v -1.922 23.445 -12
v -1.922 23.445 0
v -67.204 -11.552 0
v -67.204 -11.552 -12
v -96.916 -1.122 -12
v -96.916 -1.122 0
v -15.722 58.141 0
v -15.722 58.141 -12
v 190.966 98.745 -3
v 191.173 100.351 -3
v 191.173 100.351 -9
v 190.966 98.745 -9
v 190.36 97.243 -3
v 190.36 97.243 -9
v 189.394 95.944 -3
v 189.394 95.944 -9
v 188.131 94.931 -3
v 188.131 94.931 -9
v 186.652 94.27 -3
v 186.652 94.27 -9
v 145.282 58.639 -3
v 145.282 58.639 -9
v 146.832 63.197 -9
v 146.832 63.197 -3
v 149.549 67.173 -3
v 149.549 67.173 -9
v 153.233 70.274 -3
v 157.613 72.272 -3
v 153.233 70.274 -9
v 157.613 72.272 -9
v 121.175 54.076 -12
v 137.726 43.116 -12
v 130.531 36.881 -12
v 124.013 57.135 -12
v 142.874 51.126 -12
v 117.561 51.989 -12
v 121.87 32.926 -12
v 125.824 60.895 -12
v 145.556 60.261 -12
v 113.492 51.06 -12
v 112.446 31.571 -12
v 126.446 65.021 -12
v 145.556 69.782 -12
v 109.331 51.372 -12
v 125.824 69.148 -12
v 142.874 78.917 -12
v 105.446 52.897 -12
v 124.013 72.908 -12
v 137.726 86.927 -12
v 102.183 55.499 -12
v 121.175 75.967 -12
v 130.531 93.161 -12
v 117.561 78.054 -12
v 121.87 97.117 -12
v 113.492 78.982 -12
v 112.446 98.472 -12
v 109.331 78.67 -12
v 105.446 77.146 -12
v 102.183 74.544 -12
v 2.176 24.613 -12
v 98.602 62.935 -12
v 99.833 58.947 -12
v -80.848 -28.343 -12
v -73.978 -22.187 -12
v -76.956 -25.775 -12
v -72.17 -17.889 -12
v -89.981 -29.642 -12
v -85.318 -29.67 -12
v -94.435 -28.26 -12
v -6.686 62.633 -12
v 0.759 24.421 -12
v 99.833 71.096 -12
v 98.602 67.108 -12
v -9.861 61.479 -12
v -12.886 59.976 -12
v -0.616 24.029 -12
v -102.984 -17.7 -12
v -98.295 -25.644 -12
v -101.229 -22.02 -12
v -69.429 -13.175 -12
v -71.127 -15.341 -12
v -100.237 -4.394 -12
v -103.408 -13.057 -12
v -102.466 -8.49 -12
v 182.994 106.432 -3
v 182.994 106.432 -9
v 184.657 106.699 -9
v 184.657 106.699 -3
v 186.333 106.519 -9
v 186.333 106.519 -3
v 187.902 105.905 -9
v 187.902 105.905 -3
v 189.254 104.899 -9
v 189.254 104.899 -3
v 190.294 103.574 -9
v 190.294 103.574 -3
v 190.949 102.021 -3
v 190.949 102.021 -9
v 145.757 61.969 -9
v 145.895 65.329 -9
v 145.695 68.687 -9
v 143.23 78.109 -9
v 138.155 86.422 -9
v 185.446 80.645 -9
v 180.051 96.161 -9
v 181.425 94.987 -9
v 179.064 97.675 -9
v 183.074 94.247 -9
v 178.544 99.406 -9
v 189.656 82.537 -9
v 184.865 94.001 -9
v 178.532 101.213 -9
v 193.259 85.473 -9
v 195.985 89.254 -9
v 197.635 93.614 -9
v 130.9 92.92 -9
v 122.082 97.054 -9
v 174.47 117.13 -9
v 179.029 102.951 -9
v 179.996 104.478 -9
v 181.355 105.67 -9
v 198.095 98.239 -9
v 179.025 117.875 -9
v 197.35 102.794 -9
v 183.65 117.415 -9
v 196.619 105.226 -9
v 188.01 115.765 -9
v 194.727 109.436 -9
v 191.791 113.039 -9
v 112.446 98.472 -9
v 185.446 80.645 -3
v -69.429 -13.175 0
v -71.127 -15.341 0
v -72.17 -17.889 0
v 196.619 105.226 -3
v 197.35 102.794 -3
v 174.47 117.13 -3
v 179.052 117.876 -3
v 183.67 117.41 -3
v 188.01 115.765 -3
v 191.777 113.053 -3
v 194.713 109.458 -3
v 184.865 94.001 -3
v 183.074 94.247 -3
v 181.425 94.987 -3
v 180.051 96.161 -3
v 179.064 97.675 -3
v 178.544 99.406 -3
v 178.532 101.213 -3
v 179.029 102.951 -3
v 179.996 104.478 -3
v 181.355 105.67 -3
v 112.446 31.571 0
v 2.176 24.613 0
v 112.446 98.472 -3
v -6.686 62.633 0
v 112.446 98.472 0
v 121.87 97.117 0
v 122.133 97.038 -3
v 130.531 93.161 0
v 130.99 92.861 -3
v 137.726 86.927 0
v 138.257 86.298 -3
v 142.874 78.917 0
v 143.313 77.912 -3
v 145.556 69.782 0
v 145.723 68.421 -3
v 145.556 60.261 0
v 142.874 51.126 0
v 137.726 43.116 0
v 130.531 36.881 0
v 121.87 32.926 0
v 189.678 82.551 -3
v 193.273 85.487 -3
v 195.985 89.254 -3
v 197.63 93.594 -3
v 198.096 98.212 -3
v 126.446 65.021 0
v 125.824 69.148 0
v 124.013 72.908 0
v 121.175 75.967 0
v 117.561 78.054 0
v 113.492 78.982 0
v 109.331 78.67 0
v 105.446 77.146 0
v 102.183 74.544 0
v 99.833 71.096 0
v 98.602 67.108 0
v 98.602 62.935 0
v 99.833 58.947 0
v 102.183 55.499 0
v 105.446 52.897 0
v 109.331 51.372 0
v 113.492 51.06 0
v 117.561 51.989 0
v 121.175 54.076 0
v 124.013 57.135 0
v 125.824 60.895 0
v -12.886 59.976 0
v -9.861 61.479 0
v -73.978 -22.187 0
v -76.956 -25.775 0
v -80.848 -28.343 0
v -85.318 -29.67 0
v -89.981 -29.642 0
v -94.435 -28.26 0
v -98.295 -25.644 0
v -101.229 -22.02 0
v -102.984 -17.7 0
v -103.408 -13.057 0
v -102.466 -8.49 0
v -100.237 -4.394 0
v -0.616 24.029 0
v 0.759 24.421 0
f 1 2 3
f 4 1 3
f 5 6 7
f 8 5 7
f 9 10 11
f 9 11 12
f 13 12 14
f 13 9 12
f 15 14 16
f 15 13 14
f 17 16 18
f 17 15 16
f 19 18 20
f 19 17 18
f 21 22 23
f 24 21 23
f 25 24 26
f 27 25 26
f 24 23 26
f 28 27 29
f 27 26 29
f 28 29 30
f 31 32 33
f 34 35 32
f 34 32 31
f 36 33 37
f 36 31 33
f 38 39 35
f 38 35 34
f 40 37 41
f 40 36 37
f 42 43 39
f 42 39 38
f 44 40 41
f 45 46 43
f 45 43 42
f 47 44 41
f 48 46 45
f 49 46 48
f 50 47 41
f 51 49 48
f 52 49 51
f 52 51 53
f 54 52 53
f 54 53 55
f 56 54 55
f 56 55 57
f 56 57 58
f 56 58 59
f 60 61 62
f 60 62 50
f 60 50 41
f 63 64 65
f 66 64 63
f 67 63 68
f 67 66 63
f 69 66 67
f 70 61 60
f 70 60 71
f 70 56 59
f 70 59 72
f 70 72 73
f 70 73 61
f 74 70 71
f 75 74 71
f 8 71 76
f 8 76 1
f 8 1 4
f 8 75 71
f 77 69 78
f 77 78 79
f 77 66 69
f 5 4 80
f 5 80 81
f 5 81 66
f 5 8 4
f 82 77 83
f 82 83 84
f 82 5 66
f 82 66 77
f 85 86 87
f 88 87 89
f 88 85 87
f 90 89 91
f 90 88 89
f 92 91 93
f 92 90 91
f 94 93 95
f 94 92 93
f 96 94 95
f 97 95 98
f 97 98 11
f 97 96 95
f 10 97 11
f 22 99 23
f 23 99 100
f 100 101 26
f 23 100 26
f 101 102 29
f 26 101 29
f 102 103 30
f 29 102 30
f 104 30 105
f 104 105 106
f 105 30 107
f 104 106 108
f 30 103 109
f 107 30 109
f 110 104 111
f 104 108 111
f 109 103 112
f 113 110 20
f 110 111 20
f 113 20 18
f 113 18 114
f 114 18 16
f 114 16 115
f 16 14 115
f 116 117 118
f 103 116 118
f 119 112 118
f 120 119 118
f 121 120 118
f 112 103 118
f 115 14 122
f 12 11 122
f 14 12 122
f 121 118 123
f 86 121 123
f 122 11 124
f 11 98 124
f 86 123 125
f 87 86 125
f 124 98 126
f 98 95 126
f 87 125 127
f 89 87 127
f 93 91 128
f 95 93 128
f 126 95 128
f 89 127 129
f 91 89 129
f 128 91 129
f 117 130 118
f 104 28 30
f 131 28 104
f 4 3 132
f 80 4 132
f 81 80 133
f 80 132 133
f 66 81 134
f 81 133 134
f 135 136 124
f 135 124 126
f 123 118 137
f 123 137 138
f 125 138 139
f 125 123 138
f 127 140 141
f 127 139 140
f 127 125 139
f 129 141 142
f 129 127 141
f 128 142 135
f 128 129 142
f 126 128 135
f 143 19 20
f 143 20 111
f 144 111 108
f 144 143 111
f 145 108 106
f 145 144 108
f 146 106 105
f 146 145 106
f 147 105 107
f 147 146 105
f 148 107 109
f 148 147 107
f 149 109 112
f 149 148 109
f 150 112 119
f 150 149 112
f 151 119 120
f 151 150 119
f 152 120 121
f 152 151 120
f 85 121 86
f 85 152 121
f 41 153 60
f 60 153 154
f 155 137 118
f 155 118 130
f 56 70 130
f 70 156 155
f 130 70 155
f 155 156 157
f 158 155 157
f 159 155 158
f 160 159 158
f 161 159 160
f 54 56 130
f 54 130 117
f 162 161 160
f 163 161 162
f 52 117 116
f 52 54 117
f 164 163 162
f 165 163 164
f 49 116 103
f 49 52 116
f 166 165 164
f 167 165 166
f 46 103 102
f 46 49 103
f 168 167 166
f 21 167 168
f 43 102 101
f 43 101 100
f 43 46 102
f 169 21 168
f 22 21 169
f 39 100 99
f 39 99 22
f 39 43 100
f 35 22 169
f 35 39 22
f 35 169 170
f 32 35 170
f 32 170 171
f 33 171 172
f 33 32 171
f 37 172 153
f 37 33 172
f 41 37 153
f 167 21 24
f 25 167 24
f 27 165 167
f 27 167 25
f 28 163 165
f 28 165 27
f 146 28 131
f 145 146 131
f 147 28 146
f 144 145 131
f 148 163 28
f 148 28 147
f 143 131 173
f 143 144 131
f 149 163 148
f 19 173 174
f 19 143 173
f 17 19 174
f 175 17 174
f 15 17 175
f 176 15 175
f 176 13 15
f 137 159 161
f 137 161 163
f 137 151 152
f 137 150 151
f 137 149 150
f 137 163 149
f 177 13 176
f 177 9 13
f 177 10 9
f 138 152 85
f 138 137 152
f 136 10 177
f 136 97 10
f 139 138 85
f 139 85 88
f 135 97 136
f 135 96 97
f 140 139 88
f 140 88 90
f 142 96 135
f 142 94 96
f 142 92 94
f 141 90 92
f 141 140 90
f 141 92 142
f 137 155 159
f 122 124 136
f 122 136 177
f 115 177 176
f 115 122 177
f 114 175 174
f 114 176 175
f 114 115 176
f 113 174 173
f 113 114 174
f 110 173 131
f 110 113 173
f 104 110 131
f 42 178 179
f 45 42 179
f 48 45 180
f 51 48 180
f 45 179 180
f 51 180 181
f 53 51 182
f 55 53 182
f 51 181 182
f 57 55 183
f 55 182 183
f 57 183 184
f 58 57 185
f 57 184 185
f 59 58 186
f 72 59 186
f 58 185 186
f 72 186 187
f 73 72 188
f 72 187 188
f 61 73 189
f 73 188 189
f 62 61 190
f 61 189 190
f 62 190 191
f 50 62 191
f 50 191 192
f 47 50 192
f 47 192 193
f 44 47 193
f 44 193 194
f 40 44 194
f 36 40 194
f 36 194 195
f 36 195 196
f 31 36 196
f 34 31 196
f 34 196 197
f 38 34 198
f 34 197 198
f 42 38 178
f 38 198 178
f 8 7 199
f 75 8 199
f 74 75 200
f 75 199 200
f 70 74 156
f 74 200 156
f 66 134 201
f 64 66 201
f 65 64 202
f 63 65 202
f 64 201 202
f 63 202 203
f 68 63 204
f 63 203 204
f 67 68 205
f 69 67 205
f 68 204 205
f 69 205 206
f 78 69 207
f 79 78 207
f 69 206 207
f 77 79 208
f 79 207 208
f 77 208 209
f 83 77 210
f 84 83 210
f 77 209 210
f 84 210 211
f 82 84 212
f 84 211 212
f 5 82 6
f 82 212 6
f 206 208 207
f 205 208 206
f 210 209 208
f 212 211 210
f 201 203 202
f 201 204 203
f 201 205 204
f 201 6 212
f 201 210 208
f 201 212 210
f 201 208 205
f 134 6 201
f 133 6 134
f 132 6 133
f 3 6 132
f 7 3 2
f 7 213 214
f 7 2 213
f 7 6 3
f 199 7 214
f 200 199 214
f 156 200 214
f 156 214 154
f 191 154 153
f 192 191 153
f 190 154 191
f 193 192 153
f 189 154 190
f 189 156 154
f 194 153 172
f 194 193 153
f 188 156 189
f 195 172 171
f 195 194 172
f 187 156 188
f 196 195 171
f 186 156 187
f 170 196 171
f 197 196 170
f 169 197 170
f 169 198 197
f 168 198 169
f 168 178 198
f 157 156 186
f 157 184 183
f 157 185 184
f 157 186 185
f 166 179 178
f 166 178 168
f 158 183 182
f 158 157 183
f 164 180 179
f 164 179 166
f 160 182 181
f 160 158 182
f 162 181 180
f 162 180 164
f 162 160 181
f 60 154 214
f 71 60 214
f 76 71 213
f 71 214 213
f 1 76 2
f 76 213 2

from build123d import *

# Parameters (mm, degrees)
SKETCH1_R           = 14
BOSS_EXTRUDE1_DEPTH = 12
BOSS_EXTRUDE2_DEPTH = 9
FILLET1_R           = 17.78
CUT_EXTRUDE2_START  = -3
CUT_EXTRUDE2_DEPTH  = 3


with BuildPart() as part:
    # Sketch1 → Boss-Extrude1 (new body)
    with BuildSketch(Plane.XY):
        with BuildLine():
            Line((-96.91554928, -1.121955778), (-15.722399936, 58.140946839))
            ThreePointArc((-15.722399936, 58.140946839), (-11.394783315, 60.770107897), (-6.686327841, 62.633223709))
            Line((-6.686327841, 62.633223709), (112.446127039, 98.471593282))
            ThreePointArc((112.446127039, 98.471593282), (145.896391136, 65.021329185), (112.446127039, 31.571065087))
            Line((112.446127039, 31.571065087), (2.176317829, 24.613004518))
            ThreePointArc((2.176317829, 24.613004518), (0.064344939, 24.249840519), (-1.921888512, 23.445356673))
            Line((-1.921888512, 23.445356673), (-67.204247556, -11.552416003))
            ThreePointArc((-67.204247556, -11.552416003), (-70.352621766, -14.199342537), (-72.170382748, -17.889088499))
            ThreePointArc((-72.170382748, -17.889088499), (-96.461185182, -27.094594937), (-96.91554928, -1.121955778))
        make_face()
        with Locations((112.446127039, 65.021329185)):
            Circle(SKETCH1_R, mode=Mode.SUBTRACT)
    extrude(amount=-BOSS_EXTRUDE1_DEPTH)

    # Sketch2 → Boss-Extrude2 (add)
    with BuildSketch(Plane.XY):
        with BuildLine():
            Line((179.335031787, 118.593643911), (112.446127039, 98.471593282))
            ThreePointArc((112.446127039, 98.471593282), (134.765386203, 89.936602382), (145.694919218, 68.687115155))
            Line((145.694919218, 68.687115155), (190.310695767, 82.108786775))
            Line((190.310695767, 82.108786775), (186.652141107, 94.270405821))
            ThreePointArc((186.652141107, 94.270405821), (178.742054254, 98.521938013), (182.993586447, 106.432024866))
            Line((182.993586447, 106.432024866), (179.335031787, 118.593643911))
        make_face()
        with BuildLine():
            Line((191.496650832, 122.252198571), (179.335031787, 118.593643911))
            Line((179.335031787, 118.593643911), (182.993586447, 106.432024866))
            ThreePointArc((182.993586447, 106.432024866), (188.611437978, 105.447214315), (191.172863777, 100.351215343))
            ThreePointArc((191.172863777, 100.351215343), (189.918862749, 96.562641142), (186.652141107, 94.270405821))
            Line((186.652141107, 94.270405821), (190.310695767, 82.108786775))
            Line((190.310695767, 82.108786775), (202.472314812, 85.767341435))
            Line((202.472314812, 85.767341435), (191.496650832, 122.252198571))
        make_face()
    extrude(amount=-BOSS_EXTRUDE2_DEPTH)

    # Fillet1
    fillet1_edges = [part.edges().sort_by_distance(p)[0] for p in [
        (191.496650832, 122.252198571, -4.5),
        (202.472314812, 85.767341435, -4.5),
        (145.694919218, 68.687115155, -4.5),
    ]]
    fillet(fillet1_edges, radius=FILLET1_R)

    # Sketch4 → Cut-Extrude2 (cut)
    with BuildSketch(Plane.XY.offset(CUT_EXTRUDE2_START)):
        with BuildLine():
            Line((174.470384169, 117.130222047), (112.446127039, 98.471593282))
            ThreePointArc((112.446127039, 98.471593282), (138.257160255, 86.298329266), (145.281823298, 58.638757657))
            ThreePointArc((145.281823298, 58.638757657), (149.548777584, 67.172961066), (157.613182204, 72.272461516))
            Line((157.613182204, 72.272461516), (185.446048149, 80.645364911))
            ThreePointArc((185.446048149, 80.645364911), (195.985244574, 89.254027292), (197.350338288, 102.793608099))
            Line((197.350338288, 102.793608099), (196.618627356, 105.225931908))
            ThreePointArc((196.618627356, 105.225931908), (188.009964976, 115.765128333), (174.470384169, 117.130222047))
        make_face()
    extrude(amount=CUT_EXTRUDE2_DEPTH, mode=Mode.SUBTRACT)


solid = part.part
